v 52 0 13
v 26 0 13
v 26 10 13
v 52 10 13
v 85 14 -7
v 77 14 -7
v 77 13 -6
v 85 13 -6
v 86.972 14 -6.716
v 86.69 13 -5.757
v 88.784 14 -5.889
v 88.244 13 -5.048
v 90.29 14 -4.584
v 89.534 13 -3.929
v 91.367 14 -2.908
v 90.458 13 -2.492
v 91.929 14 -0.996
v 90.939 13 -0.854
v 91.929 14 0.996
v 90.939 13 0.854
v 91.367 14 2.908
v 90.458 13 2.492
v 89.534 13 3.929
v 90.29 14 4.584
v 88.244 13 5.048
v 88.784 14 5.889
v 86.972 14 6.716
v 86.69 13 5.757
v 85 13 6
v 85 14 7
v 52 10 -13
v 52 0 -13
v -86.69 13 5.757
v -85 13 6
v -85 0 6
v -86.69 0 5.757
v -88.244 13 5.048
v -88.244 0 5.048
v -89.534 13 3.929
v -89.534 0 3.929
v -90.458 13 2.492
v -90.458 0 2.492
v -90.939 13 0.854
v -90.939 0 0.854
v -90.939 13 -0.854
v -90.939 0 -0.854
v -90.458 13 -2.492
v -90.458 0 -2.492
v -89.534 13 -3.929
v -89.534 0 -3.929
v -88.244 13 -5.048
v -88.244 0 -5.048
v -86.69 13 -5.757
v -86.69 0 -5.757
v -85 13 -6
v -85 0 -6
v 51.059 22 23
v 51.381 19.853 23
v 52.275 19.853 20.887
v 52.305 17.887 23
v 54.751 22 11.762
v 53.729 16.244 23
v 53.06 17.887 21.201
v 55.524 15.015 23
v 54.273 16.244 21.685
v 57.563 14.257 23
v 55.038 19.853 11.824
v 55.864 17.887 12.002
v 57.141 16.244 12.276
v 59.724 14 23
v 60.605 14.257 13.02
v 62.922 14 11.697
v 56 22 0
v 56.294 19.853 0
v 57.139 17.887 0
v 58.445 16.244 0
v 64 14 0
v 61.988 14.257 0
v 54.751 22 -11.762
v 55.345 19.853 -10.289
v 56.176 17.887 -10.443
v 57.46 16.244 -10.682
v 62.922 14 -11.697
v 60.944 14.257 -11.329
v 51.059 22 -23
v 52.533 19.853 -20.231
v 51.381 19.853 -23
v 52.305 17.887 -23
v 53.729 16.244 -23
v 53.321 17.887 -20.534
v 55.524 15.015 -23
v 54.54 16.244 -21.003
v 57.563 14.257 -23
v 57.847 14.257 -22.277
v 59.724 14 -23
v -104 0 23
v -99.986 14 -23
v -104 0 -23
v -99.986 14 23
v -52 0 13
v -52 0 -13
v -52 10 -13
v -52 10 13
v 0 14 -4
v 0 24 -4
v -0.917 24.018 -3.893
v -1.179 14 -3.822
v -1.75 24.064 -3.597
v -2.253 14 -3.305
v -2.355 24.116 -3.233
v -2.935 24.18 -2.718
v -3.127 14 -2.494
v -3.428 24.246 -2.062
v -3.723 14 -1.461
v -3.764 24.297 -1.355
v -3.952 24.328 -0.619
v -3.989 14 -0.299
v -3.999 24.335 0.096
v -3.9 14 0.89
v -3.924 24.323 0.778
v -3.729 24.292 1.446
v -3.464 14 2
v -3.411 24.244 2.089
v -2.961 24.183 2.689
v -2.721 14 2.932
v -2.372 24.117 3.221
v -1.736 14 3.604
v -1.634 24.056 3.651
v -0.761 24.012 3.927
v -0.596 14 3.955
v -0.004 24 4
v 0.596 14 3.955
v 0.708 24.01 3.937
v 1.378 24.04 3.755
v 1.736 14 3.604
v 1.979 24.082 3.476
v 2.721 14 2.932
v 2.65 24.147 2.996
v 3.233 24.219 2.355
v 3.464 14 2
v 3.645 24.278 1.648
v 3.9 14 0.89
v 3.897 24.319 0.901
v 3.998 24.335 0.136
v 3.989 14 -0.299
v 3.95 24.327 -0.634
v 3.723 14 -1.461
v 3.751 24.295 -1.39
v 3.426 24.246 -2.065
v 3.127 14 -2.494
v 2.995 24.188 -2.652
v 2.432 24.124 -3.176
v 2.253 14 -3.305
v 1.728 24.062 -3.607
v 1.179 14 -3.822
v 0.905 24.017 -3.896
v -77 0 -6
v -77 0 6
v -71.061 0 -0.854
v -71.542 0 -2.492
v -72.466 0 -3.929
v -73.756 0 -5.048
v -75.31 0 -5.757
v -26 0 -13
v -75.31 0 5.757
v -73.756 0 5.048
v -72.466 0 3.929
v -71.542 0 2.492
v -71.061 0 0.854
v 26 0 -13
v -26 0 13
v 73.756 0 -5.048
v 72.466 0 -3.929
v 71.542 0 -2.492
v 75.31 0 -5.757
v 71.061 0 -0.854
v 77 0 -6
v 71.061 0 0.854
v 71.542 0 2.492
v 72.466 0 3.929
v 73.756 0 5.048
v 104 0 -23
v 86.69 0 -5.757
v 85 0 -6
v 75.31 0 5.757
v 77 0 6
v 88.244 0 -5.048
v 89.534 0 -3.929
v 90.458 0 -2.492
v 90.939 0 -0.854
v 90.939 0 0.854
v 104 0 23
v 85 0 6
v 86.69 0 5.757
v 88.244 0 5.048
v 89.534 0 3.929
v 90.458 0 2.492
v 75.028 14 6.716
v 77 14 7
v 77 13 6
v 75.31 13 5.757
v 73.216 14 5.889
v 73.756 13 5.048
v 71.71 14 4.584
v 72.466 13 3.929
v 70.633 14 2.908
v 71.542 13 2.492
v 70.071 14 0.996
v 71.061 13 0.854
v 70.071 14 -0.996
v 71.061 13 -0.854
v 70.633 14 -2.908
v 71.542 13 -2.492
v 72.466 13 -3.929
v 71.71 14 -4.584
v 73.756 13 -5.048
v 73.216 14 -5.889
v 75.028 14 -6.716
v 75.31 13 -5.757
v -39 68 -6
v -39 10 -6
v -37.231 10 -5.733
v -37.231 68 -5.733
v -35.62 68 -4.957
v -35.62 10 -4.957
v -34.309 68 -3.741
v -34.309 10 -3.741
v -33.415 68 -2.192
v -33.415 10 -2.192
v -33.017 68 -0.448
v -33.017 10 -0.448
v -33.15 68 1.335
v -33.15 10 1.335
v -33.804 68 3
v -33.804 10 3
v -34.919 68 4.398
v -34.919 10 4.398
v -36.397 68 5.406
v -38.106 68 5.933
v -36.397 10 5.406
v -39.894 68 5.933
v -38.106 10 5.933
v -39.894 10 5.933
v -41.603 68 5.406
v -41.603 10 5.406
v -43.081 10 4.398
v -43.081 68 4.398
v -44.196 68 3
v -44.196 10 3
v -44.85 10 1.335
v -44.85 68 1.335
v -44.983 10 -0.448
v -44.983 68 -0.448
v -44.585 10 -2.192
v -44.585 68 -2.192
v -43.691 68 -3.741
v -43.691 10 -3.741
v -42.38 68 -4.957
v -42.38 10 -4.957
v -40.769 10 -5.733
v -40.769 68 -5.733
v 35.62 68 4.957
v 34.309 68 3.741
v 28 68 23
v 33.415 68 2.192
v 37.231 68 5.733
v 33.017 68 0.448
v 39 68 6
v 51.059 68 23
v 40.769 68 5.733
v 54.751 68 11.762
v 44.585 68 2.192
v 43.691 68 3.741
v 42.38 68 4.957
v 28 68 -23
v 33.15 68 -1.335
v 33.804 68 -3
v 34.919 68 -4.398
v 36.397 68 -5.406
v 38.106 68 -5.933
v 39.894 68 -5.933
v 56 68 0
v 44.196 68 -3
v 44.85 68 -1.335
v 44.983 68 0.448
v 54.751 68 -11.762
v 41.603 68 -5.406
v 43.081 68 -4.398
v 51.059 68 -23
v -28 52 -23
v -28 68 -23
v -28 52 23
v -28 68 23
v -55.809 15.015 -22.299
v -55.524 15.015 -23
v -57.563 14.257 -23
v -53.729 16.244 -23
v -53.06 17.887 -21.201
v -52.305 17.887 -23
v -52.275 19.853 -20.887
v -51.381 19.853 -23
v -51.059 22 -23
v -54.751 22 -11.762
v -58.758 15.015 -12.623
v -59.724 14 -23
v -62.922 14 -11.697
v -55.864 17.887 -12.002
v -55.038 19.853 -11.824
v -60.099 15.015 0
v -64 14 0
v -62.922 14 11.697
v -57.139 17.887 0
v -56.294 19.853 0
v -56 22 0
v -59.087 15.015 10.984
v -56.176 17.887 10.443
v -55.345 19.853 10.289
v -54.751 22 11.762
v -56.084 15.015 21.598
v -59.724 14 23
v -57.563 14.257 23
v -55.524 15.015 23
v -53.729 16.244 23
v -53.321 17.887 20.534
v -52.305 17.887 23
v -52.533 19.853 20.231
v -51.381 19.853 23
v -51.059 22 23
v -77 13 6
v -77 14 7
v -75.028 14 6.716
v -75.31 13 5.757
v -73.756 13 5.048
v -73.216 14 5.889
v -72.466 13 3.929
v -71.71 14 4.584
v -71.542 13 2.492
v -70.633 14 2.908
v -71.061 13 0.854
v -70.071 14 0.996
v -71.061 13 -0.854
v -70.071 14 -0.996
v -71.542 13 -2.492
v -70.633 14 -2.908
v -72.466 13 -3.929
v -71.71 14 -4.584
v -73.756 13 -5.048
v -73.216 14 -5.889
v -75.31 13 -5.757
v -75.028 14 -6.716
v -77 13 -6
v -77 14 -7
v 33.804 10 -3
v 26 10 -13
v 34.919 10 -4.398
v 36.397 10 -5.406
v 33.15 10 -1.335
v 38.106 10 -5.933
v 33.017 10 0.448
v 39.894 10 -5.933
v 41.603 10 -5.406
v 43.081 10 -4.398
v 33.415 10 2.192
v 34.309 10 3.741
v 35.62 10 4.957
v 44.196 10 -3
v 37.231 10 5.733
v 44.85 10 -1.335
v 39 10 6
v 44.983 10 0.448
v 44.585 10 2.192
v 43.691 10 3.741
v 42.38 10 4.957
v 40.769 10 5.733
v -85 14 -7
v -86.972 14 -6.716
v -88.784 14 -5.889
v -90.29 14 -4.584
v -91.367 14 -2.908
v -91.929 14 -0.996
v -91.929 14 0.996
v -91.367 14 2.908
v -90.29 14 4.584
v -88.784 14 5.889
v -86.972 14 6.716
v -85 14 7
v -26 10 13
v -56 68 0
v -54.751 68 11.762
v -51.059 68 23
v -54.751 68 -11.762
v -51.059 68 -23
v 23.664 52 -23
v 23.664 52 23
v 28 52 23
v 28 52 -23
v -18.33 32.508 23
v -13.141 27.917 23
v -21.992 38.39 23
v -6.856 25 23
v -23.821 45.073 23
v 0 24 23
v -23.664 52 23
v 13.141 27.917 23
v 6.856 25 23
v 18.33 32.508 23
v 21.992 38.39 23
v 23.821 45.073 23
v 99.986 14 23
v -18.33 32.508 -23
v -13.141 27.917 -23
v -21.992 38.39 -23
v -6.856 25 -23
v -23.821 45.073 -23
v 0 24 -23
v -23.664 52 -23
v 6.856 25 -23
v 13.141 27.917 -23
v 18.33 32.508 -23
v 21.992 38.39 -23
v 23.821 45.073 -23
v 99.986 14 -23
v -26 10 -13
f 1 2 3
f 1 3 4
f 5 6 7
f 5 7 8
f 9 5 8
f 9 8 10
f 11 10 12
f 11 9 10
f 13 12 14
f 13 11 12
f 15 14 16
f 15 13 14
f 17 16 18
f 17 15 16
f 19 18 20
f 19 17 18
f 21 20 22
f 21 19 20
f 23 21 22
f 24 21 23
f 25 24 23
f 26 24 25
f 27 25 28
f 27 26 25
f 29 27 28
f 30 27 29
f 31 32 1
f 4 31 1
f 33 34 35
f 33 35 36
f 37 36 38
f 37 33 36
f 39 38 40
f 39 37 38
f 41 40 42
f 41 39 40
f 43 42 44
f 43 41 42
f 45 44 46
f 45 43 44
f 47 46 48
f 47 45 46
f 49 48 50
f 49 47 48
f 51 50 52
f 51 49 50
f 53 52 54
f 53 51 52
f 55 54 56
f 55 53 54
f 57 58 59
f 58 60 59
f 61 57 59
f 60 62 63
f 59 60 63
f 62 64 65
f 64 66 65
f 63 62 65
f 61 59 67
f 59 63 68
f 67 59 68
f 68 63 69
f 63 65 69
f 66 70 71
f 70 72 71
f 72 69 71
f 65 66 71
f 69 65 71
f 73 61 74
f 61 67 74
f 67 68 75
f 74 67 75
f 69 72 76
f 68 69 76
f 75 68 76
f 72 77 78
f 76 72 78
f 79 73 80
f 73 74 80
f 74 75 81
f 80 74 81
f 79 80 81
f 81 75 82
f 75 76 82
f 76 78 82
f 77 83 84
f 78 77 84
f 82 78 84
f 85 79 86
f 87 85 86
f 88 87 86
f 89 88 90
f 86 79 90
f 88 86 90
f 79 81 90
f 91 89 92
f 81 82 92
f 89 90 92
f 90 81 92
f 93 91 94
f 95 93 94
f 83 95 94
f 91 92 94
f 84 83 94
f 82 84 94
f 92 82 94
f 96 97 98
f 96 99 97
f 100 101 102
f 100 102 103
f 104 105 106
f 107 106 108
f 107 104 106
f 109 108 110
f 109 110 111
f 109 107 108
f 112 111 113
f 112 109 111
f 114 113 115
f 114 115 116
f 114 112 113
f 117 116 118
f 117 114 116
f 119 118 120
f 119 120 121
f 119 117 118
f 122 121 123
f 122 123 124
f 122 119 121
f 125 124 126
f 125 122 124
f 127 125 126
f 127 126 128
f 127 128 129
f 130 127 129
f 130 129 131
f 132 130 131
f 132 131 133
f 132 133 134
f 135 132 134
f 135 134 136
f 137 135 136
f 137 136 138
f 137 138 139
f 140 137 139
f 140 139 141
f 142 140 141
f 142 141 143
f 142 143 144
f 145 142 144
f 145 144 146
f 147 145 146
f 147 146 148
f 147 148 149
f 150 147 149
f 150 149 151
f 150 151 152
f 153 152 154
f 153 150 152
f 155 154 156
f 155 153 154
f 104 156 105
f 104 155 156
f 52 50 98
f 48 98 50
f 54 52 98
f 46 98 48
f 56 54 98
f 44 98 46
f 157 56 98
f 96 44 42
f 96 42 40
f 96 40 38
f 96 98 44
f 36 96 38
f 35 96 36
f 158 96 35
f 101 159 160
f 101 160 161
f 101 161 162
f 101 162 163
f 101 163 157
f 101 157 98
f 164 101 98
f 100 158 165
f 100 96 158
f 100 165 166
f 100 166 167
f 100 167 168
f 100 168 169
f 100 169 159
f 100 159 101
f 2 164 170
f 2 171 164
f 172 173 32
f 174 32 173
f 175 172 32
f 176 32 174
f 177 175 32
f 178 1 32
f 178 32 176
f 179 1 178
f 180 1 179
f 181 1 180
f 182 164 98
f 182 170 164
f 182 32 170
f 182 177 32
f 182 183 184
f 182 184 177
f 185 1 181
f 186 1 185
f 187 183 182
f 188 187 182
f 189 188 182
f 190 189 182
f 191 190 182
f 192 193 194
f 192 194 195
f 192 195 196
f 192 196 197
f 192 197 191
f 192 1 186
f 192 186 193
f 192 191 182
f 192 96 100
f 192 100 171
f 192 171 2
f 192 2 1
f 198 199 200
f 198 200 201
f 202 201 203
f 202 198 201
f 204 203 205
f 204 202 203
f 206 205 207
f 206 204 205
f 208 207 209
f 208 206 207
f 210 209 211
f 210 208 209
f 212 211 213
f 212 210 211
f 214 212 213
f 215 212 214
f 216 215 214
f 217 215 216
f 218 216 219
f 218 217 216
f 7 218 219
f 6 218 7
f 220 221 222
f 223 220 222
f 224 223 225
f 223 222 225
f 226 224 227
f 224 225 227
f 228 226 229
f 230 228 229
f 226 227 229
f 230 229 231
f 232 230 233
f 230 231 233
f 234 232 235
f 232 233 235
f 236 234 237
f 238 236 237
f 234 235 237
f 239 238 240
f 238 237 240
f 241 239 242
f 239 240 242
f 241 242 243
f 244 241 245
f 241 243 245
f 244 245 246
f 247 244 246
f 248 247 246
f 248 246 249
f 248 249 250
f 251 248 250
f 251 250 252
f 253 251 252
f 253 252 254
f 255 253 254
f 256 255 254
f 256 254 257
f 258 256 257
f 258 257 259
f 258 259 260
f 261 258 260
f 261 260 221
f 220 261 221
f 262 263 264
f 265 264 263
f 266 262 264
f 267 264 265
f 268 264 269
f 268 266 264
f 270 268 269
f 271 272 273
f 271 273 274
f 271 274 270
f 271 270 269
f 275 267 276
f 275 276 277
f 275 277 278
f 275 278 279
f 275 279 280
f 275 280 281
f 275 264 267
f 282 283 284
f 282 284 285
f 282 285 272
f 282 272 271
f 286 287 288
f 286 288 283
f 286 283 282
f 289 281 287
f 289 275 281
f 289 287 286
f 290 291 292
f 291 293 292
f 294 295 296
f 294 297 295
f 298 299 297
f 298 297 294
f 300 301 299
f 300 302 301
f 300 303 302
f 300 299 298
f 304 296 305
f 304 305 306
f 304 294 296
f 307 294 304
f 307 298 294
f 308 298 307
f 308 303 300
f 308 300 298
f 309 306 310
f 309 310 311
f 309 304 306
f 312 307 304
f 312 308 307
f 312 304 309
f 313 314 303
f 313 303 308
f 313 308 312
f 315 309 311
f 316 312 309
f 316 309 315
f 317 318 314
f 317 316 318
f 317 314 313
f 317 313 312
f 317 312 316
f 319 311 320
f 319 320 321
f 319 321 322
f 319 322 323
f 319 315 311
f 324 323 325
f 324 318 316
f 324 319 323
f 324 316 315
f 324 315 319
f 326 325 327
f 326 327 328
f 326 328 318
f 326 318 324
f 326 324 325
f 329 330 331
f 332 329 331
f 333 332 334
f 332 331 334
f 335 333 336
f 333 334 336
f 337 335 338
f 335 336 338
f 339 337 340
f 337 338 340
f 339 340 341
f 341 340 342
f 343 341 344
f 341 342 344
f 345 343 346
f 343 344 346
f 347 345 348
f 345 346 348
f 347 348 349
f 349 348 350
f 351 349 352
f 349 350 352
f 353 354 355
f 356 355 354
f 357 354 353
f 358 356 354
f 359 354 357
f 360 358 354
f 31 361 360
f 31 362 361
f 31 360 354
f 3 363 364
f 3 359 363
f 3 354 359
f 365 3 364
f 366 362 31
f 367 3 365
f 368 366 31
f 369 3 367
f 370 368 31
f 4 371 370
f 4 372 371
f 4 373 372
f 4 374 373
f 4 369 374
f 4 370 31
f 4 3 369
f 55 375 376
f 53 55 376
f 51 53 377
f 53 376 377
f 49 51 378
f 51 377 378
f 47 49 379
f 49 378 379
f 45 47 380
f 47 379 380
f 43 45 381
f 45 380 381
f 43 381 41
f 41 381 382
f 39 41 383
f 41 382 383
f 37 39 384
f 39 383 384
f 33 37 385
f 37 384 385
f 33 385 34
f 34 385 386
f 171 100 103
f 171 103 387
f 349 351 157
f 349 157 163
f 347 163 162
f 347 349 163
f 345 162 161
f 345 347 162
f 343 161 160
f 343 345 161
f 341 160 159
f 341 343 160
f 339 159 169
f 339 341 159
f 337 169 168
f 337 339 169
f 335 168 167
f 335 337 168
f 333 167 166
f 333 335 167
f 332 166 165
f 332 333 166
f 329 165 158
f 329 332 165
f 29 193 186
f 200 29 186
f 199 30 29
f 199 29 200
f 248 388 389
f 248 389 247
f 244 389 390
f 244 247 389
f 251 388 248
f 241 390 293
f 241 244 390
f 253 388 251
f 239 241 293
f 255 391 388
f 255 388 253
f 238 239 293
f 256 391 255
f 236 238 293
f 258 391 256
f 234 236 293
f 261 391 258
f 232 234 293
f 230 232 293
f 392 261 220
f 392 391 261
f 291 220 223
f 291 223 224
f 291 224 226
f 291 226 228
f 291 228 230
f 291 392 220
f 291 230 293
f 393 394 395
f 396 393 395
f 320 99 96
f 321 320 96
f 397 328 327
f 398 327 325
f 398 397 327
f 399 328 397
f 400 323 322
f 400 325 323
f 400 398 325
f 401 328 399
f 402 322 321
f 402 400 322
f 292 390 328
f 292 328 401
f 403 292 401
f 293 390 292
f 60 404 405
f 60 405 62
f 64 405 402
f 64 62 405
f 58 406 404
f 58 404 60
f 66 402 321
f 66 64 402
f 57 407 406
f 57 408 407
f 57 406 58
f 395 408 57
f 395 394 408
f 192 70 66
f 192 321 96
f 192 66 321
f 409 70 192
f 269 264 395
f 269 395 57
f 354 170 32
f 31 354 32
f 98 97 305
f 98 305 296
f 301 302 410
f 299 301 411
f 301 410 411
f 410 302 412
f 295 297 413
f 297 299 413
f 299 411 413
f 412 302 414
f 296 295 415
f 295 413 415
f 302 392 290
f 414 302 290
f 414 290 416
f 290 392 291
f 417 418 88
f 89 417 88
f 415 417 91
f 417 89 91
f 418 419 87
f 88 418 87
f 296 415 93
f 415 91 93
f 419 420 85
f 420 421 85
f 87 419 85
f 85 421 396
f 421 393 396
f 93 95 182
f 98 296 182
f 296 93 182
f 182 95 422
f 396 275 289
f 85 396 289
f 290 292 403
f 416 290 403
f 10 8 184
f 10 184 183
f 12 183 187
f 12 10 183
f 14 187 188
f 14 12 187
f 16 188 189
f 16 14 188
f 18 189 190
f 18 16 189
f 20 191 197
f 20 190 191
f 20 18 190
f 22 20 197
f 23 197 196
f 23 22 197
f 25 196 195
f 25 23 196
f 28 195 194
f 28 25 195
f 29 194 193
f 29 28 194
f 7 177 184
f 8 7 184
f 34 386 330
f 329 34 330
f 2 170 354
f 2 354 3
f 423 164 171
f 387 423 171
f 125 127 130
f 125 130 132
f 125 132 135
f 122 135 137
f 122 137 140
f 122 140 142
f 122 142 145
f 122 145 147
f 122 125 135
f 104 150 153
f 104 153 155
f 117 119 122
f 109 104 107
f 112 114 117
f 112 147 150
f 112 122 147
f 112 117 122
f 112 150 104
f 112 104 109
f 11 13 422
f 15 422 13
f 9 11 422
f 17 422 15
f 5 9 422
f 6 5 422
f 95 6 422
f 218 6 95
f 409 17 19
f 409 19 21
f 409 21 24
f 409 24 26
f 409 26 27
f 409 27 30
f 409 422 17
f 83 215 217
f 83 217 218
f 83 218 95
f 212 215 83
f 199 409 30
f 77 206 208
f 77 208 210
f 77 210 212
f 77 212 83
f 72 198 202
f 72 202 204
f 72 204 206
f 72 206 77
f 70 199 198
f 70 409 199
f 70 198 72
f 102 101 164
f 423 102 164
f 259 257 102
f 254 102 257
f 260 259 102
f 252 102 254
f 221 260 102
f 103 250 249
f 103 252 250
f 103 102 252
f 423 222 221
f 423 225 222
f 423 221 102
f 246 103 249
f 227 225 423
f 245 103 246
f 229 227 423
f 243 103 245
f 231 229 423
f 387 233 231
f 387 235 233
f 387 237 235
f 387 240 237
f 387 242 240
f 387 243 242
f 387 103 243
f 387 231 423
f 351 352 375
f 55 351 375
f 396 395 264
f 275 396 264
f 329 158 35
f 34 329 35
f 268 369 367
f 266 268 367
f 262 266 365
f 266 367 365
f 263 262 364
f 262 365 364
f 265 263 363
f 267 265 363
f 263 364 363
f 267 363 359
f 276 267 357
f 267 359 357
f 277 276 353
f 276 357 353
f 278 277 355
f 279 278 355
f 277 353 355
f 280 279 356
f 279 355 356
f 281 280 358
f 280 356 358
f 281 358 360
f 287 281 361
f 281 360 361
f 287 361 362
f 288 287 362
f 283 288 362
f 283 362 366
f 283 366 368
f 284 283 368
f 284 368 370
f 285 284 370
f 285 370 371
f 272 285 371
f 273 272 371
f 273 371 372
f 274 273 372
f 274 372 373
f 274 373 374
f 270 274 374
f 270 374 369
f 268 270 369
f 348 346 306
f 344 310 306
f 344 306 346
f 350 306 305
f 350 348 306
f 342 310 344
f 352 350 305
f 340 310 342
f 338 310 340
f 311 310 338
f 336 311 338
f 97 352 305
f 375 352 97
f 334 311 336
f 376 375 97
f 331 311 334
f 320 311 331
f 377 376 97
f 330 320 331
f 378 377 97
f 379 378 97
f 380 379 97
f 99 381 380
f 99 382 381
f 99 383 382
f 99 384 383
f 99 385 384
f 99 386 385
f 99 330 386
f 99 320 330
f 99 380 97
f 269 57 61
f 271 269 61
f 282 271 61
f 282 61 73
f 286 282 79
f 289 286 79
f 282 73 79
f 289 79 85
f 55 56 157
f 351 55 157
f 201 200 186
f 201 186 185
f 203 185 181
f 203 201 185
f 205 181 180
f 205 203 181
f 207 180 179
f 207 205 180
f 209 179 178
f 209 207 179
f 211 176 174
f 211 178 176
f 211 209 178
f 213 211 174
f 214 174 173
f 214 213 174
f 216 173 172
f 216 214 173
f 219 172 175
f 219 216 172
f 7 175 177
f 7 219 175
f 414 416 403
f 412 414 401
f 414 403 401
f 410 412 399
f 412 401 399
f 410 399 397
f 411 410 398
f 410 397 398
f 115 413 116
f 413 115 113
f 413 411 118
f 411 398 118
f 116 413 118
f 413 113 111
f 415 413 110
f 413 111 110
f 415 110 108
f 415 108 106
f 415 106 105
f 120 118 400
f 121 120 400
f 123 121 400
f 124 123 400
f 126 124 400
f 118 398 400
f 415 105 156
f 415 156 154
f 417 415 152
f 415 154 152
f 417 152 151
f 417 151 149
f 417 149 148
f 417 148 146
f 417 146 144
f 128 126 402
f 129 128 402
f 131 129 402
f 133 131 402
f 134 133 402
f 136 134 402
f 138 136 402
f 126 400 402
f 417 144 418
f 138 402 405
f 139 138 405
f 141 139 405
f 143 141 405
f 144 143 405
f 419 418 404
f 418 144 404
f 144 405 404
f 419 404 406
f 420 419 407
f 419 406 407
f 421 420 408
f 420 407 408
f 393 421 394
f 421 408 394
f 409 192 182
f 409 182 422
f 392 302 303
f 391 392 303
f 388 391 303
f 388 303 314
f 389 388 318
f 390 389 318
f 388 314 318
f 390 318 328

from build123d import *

# Parameters (mm, degrees)
BOSS_EXTRUDE2_DEPTH = 23
BOSS_EXTRUDE3_DEPTH = 54
CUT_EXTRUDE1_DEPTH  = 27
CUT_EXTRUDE3_DEPTH  = 127.368508735
SKETCH8_W           = 26
SKETCH8_H           = 26
CUT_EXTRUDE4_DEPTH  = 10
SKETCH9_R           = 6
CUT_EXTRUDE5_DEPTH  = 127.368508735
SKETCH10_R          = 4
CUT_EXTRUDE7_DEPTH  = 52
CHAMFER2_SIZE       = 1
FILLET1_R           = 8


with BuildPart() as part:
    # Sketch1 → Boss-Extrude2 (new, symmetric)
    with BuildSketch(Plane.XY):
        Polygon((-104, 0), (104, 0), (99.985564599, 14), (-99.985564599, 14), align=None)
    extrude(amount=BOSS_EXTRUDE2_DEPTH, both=True)

    # Sketch3 → Boss-Extrude3 (add)
    with BuildSketch(Plane(origin=(0, 14, 0), x_dir=(1, 0, 0), z_dir=(0, 1, 0))):
        with BuildLine():
            ThreePointArc((51.058789645, -23), (56, 0), (51.058789645, 23))
            Line((51.058789645, 23), (-51.058789645, 23))
            ThreePointArc((-51.058789645, 23), (-56, 0), (-51.058789645, -23))
            Line((-51.058789645, -23), (51.058789645, -23))
        make_face()
    extrude(amount=BOSS_EXTRUDE3_DEPTH)

    # Sketch5 → Cut-Extrude1 (cut, symmetric)
    with BuildSketch(Plane.XY):
        with BuildLine():
            Line((-28, 75.269278216), (-28, 52))
            Line((-28, 52), (-23.664319132, 52))
            ThreePointArc((-23.664319132, 52), (0, 24), (23.664319132, 52))
            Line((23.664319132, 52), (28, 52))
            Line((28, 52), (28, 75.269278216))
            Line((28, 75.269278216), (-28, 75.269278216))
        make_face()
    extrude(amount=CUT_EXTRUDE1_DEPTH, both=True, mode=Mode.SUBTRACT)

    # Sketch6 → Cut-Extrude3 (cut, through all)
    with BuildSketch(Plane(origin=(0, 68, 0), x_dir=(1, 0, 0), z_dir=(0, 1, 0))):
        with BuildLine():
            Line((-85, 6), (-77, 6))
            ThreePointArc((-77, 6), (-71, 0), (-77, -6))
            Line((-77, -6), (-85, -6))
            ThreePointArc((-85, -6), (-91, 0), (-85, 6))
        make_face()
        with BuildLine():
            Line((77, 6), (85, 6))
            ThreePointArc((85, 6), (91, 0), (85, -6))
            Line((85, -6), (77, -6))
            ThreePointArc((77, -6), (71, 0), (77, 6))
        make_face()
    extrude(amount=-CUT_EXTRUDE3_DEPTH, mode=Mode.SUBTRACT)

    # Sketch8 → Cut-Extrude4 (cut)
    with BuildSketch(Plane.XZ):
        with Locations((39, 0)):
            Rectangle(SKETCH8_W, SKETCH8_H)
        with Locations((-39, 0)):
            Rectangle(SKETCH8_W, SKETCH8_H)
    extrude(amount=-CUT_EXTRUDE4_DEPTH, mode=Mode.SUBTRACT)

    # Sketch9 → Cut-Extrude5 (cut, through all)
    with BuildSketch(Plane.XZ):
        with Locations(Location((-39, 0, 0), (0, 0, 270))):
            Circle(SKETCH9_R)
        with Locations(Location((39, 0, 0), (0, 0, 90))):
            Circle(SKETCH9_R)
    extrude(amount=-CUT_EXTRUDE5_DEPTH, mode=Mode.SUBTRACT)

    # Sketch10 → Cut-Extrude7 (cut)
    with BuildSketch(Plane(origin=(0, 14, 0), x_dir=(1, 0, 0), z_dir=(0, 1, 0))):
        with Locations(Location((0, 0, 0), (0, 0, 90))):
            Circle(SKETCH10_R)
    extrude(amount=CUT_EXTRUDE7_DEPTH, mode=Mode.SUBTRACT)

    # Chamfer2
    chamfer2_edges = [part.edges().sort_by_distance(p)[0] for p in [
        (81, 14, 6),
        (91, 14, 0),
        (81, 14, -6),
        (71, 14, 0),
        (-91, 14, 0),
        (-81, 14, -6),
        (-71, 14, 0),
        (-81, 14, 6),
    ]]
    chamfer(chamfer2_edges, length=CHAMFER2_SIZE)

    # Fillet1
    fillet1_edges = [part.edges().sort_by_distance(p)[0] for p in [
        (56, 14, 0),
        (-56, 14, 0),
    ]]
    fillet(fillet1_edges, radius=FILLET1_R)


solid = part.part
